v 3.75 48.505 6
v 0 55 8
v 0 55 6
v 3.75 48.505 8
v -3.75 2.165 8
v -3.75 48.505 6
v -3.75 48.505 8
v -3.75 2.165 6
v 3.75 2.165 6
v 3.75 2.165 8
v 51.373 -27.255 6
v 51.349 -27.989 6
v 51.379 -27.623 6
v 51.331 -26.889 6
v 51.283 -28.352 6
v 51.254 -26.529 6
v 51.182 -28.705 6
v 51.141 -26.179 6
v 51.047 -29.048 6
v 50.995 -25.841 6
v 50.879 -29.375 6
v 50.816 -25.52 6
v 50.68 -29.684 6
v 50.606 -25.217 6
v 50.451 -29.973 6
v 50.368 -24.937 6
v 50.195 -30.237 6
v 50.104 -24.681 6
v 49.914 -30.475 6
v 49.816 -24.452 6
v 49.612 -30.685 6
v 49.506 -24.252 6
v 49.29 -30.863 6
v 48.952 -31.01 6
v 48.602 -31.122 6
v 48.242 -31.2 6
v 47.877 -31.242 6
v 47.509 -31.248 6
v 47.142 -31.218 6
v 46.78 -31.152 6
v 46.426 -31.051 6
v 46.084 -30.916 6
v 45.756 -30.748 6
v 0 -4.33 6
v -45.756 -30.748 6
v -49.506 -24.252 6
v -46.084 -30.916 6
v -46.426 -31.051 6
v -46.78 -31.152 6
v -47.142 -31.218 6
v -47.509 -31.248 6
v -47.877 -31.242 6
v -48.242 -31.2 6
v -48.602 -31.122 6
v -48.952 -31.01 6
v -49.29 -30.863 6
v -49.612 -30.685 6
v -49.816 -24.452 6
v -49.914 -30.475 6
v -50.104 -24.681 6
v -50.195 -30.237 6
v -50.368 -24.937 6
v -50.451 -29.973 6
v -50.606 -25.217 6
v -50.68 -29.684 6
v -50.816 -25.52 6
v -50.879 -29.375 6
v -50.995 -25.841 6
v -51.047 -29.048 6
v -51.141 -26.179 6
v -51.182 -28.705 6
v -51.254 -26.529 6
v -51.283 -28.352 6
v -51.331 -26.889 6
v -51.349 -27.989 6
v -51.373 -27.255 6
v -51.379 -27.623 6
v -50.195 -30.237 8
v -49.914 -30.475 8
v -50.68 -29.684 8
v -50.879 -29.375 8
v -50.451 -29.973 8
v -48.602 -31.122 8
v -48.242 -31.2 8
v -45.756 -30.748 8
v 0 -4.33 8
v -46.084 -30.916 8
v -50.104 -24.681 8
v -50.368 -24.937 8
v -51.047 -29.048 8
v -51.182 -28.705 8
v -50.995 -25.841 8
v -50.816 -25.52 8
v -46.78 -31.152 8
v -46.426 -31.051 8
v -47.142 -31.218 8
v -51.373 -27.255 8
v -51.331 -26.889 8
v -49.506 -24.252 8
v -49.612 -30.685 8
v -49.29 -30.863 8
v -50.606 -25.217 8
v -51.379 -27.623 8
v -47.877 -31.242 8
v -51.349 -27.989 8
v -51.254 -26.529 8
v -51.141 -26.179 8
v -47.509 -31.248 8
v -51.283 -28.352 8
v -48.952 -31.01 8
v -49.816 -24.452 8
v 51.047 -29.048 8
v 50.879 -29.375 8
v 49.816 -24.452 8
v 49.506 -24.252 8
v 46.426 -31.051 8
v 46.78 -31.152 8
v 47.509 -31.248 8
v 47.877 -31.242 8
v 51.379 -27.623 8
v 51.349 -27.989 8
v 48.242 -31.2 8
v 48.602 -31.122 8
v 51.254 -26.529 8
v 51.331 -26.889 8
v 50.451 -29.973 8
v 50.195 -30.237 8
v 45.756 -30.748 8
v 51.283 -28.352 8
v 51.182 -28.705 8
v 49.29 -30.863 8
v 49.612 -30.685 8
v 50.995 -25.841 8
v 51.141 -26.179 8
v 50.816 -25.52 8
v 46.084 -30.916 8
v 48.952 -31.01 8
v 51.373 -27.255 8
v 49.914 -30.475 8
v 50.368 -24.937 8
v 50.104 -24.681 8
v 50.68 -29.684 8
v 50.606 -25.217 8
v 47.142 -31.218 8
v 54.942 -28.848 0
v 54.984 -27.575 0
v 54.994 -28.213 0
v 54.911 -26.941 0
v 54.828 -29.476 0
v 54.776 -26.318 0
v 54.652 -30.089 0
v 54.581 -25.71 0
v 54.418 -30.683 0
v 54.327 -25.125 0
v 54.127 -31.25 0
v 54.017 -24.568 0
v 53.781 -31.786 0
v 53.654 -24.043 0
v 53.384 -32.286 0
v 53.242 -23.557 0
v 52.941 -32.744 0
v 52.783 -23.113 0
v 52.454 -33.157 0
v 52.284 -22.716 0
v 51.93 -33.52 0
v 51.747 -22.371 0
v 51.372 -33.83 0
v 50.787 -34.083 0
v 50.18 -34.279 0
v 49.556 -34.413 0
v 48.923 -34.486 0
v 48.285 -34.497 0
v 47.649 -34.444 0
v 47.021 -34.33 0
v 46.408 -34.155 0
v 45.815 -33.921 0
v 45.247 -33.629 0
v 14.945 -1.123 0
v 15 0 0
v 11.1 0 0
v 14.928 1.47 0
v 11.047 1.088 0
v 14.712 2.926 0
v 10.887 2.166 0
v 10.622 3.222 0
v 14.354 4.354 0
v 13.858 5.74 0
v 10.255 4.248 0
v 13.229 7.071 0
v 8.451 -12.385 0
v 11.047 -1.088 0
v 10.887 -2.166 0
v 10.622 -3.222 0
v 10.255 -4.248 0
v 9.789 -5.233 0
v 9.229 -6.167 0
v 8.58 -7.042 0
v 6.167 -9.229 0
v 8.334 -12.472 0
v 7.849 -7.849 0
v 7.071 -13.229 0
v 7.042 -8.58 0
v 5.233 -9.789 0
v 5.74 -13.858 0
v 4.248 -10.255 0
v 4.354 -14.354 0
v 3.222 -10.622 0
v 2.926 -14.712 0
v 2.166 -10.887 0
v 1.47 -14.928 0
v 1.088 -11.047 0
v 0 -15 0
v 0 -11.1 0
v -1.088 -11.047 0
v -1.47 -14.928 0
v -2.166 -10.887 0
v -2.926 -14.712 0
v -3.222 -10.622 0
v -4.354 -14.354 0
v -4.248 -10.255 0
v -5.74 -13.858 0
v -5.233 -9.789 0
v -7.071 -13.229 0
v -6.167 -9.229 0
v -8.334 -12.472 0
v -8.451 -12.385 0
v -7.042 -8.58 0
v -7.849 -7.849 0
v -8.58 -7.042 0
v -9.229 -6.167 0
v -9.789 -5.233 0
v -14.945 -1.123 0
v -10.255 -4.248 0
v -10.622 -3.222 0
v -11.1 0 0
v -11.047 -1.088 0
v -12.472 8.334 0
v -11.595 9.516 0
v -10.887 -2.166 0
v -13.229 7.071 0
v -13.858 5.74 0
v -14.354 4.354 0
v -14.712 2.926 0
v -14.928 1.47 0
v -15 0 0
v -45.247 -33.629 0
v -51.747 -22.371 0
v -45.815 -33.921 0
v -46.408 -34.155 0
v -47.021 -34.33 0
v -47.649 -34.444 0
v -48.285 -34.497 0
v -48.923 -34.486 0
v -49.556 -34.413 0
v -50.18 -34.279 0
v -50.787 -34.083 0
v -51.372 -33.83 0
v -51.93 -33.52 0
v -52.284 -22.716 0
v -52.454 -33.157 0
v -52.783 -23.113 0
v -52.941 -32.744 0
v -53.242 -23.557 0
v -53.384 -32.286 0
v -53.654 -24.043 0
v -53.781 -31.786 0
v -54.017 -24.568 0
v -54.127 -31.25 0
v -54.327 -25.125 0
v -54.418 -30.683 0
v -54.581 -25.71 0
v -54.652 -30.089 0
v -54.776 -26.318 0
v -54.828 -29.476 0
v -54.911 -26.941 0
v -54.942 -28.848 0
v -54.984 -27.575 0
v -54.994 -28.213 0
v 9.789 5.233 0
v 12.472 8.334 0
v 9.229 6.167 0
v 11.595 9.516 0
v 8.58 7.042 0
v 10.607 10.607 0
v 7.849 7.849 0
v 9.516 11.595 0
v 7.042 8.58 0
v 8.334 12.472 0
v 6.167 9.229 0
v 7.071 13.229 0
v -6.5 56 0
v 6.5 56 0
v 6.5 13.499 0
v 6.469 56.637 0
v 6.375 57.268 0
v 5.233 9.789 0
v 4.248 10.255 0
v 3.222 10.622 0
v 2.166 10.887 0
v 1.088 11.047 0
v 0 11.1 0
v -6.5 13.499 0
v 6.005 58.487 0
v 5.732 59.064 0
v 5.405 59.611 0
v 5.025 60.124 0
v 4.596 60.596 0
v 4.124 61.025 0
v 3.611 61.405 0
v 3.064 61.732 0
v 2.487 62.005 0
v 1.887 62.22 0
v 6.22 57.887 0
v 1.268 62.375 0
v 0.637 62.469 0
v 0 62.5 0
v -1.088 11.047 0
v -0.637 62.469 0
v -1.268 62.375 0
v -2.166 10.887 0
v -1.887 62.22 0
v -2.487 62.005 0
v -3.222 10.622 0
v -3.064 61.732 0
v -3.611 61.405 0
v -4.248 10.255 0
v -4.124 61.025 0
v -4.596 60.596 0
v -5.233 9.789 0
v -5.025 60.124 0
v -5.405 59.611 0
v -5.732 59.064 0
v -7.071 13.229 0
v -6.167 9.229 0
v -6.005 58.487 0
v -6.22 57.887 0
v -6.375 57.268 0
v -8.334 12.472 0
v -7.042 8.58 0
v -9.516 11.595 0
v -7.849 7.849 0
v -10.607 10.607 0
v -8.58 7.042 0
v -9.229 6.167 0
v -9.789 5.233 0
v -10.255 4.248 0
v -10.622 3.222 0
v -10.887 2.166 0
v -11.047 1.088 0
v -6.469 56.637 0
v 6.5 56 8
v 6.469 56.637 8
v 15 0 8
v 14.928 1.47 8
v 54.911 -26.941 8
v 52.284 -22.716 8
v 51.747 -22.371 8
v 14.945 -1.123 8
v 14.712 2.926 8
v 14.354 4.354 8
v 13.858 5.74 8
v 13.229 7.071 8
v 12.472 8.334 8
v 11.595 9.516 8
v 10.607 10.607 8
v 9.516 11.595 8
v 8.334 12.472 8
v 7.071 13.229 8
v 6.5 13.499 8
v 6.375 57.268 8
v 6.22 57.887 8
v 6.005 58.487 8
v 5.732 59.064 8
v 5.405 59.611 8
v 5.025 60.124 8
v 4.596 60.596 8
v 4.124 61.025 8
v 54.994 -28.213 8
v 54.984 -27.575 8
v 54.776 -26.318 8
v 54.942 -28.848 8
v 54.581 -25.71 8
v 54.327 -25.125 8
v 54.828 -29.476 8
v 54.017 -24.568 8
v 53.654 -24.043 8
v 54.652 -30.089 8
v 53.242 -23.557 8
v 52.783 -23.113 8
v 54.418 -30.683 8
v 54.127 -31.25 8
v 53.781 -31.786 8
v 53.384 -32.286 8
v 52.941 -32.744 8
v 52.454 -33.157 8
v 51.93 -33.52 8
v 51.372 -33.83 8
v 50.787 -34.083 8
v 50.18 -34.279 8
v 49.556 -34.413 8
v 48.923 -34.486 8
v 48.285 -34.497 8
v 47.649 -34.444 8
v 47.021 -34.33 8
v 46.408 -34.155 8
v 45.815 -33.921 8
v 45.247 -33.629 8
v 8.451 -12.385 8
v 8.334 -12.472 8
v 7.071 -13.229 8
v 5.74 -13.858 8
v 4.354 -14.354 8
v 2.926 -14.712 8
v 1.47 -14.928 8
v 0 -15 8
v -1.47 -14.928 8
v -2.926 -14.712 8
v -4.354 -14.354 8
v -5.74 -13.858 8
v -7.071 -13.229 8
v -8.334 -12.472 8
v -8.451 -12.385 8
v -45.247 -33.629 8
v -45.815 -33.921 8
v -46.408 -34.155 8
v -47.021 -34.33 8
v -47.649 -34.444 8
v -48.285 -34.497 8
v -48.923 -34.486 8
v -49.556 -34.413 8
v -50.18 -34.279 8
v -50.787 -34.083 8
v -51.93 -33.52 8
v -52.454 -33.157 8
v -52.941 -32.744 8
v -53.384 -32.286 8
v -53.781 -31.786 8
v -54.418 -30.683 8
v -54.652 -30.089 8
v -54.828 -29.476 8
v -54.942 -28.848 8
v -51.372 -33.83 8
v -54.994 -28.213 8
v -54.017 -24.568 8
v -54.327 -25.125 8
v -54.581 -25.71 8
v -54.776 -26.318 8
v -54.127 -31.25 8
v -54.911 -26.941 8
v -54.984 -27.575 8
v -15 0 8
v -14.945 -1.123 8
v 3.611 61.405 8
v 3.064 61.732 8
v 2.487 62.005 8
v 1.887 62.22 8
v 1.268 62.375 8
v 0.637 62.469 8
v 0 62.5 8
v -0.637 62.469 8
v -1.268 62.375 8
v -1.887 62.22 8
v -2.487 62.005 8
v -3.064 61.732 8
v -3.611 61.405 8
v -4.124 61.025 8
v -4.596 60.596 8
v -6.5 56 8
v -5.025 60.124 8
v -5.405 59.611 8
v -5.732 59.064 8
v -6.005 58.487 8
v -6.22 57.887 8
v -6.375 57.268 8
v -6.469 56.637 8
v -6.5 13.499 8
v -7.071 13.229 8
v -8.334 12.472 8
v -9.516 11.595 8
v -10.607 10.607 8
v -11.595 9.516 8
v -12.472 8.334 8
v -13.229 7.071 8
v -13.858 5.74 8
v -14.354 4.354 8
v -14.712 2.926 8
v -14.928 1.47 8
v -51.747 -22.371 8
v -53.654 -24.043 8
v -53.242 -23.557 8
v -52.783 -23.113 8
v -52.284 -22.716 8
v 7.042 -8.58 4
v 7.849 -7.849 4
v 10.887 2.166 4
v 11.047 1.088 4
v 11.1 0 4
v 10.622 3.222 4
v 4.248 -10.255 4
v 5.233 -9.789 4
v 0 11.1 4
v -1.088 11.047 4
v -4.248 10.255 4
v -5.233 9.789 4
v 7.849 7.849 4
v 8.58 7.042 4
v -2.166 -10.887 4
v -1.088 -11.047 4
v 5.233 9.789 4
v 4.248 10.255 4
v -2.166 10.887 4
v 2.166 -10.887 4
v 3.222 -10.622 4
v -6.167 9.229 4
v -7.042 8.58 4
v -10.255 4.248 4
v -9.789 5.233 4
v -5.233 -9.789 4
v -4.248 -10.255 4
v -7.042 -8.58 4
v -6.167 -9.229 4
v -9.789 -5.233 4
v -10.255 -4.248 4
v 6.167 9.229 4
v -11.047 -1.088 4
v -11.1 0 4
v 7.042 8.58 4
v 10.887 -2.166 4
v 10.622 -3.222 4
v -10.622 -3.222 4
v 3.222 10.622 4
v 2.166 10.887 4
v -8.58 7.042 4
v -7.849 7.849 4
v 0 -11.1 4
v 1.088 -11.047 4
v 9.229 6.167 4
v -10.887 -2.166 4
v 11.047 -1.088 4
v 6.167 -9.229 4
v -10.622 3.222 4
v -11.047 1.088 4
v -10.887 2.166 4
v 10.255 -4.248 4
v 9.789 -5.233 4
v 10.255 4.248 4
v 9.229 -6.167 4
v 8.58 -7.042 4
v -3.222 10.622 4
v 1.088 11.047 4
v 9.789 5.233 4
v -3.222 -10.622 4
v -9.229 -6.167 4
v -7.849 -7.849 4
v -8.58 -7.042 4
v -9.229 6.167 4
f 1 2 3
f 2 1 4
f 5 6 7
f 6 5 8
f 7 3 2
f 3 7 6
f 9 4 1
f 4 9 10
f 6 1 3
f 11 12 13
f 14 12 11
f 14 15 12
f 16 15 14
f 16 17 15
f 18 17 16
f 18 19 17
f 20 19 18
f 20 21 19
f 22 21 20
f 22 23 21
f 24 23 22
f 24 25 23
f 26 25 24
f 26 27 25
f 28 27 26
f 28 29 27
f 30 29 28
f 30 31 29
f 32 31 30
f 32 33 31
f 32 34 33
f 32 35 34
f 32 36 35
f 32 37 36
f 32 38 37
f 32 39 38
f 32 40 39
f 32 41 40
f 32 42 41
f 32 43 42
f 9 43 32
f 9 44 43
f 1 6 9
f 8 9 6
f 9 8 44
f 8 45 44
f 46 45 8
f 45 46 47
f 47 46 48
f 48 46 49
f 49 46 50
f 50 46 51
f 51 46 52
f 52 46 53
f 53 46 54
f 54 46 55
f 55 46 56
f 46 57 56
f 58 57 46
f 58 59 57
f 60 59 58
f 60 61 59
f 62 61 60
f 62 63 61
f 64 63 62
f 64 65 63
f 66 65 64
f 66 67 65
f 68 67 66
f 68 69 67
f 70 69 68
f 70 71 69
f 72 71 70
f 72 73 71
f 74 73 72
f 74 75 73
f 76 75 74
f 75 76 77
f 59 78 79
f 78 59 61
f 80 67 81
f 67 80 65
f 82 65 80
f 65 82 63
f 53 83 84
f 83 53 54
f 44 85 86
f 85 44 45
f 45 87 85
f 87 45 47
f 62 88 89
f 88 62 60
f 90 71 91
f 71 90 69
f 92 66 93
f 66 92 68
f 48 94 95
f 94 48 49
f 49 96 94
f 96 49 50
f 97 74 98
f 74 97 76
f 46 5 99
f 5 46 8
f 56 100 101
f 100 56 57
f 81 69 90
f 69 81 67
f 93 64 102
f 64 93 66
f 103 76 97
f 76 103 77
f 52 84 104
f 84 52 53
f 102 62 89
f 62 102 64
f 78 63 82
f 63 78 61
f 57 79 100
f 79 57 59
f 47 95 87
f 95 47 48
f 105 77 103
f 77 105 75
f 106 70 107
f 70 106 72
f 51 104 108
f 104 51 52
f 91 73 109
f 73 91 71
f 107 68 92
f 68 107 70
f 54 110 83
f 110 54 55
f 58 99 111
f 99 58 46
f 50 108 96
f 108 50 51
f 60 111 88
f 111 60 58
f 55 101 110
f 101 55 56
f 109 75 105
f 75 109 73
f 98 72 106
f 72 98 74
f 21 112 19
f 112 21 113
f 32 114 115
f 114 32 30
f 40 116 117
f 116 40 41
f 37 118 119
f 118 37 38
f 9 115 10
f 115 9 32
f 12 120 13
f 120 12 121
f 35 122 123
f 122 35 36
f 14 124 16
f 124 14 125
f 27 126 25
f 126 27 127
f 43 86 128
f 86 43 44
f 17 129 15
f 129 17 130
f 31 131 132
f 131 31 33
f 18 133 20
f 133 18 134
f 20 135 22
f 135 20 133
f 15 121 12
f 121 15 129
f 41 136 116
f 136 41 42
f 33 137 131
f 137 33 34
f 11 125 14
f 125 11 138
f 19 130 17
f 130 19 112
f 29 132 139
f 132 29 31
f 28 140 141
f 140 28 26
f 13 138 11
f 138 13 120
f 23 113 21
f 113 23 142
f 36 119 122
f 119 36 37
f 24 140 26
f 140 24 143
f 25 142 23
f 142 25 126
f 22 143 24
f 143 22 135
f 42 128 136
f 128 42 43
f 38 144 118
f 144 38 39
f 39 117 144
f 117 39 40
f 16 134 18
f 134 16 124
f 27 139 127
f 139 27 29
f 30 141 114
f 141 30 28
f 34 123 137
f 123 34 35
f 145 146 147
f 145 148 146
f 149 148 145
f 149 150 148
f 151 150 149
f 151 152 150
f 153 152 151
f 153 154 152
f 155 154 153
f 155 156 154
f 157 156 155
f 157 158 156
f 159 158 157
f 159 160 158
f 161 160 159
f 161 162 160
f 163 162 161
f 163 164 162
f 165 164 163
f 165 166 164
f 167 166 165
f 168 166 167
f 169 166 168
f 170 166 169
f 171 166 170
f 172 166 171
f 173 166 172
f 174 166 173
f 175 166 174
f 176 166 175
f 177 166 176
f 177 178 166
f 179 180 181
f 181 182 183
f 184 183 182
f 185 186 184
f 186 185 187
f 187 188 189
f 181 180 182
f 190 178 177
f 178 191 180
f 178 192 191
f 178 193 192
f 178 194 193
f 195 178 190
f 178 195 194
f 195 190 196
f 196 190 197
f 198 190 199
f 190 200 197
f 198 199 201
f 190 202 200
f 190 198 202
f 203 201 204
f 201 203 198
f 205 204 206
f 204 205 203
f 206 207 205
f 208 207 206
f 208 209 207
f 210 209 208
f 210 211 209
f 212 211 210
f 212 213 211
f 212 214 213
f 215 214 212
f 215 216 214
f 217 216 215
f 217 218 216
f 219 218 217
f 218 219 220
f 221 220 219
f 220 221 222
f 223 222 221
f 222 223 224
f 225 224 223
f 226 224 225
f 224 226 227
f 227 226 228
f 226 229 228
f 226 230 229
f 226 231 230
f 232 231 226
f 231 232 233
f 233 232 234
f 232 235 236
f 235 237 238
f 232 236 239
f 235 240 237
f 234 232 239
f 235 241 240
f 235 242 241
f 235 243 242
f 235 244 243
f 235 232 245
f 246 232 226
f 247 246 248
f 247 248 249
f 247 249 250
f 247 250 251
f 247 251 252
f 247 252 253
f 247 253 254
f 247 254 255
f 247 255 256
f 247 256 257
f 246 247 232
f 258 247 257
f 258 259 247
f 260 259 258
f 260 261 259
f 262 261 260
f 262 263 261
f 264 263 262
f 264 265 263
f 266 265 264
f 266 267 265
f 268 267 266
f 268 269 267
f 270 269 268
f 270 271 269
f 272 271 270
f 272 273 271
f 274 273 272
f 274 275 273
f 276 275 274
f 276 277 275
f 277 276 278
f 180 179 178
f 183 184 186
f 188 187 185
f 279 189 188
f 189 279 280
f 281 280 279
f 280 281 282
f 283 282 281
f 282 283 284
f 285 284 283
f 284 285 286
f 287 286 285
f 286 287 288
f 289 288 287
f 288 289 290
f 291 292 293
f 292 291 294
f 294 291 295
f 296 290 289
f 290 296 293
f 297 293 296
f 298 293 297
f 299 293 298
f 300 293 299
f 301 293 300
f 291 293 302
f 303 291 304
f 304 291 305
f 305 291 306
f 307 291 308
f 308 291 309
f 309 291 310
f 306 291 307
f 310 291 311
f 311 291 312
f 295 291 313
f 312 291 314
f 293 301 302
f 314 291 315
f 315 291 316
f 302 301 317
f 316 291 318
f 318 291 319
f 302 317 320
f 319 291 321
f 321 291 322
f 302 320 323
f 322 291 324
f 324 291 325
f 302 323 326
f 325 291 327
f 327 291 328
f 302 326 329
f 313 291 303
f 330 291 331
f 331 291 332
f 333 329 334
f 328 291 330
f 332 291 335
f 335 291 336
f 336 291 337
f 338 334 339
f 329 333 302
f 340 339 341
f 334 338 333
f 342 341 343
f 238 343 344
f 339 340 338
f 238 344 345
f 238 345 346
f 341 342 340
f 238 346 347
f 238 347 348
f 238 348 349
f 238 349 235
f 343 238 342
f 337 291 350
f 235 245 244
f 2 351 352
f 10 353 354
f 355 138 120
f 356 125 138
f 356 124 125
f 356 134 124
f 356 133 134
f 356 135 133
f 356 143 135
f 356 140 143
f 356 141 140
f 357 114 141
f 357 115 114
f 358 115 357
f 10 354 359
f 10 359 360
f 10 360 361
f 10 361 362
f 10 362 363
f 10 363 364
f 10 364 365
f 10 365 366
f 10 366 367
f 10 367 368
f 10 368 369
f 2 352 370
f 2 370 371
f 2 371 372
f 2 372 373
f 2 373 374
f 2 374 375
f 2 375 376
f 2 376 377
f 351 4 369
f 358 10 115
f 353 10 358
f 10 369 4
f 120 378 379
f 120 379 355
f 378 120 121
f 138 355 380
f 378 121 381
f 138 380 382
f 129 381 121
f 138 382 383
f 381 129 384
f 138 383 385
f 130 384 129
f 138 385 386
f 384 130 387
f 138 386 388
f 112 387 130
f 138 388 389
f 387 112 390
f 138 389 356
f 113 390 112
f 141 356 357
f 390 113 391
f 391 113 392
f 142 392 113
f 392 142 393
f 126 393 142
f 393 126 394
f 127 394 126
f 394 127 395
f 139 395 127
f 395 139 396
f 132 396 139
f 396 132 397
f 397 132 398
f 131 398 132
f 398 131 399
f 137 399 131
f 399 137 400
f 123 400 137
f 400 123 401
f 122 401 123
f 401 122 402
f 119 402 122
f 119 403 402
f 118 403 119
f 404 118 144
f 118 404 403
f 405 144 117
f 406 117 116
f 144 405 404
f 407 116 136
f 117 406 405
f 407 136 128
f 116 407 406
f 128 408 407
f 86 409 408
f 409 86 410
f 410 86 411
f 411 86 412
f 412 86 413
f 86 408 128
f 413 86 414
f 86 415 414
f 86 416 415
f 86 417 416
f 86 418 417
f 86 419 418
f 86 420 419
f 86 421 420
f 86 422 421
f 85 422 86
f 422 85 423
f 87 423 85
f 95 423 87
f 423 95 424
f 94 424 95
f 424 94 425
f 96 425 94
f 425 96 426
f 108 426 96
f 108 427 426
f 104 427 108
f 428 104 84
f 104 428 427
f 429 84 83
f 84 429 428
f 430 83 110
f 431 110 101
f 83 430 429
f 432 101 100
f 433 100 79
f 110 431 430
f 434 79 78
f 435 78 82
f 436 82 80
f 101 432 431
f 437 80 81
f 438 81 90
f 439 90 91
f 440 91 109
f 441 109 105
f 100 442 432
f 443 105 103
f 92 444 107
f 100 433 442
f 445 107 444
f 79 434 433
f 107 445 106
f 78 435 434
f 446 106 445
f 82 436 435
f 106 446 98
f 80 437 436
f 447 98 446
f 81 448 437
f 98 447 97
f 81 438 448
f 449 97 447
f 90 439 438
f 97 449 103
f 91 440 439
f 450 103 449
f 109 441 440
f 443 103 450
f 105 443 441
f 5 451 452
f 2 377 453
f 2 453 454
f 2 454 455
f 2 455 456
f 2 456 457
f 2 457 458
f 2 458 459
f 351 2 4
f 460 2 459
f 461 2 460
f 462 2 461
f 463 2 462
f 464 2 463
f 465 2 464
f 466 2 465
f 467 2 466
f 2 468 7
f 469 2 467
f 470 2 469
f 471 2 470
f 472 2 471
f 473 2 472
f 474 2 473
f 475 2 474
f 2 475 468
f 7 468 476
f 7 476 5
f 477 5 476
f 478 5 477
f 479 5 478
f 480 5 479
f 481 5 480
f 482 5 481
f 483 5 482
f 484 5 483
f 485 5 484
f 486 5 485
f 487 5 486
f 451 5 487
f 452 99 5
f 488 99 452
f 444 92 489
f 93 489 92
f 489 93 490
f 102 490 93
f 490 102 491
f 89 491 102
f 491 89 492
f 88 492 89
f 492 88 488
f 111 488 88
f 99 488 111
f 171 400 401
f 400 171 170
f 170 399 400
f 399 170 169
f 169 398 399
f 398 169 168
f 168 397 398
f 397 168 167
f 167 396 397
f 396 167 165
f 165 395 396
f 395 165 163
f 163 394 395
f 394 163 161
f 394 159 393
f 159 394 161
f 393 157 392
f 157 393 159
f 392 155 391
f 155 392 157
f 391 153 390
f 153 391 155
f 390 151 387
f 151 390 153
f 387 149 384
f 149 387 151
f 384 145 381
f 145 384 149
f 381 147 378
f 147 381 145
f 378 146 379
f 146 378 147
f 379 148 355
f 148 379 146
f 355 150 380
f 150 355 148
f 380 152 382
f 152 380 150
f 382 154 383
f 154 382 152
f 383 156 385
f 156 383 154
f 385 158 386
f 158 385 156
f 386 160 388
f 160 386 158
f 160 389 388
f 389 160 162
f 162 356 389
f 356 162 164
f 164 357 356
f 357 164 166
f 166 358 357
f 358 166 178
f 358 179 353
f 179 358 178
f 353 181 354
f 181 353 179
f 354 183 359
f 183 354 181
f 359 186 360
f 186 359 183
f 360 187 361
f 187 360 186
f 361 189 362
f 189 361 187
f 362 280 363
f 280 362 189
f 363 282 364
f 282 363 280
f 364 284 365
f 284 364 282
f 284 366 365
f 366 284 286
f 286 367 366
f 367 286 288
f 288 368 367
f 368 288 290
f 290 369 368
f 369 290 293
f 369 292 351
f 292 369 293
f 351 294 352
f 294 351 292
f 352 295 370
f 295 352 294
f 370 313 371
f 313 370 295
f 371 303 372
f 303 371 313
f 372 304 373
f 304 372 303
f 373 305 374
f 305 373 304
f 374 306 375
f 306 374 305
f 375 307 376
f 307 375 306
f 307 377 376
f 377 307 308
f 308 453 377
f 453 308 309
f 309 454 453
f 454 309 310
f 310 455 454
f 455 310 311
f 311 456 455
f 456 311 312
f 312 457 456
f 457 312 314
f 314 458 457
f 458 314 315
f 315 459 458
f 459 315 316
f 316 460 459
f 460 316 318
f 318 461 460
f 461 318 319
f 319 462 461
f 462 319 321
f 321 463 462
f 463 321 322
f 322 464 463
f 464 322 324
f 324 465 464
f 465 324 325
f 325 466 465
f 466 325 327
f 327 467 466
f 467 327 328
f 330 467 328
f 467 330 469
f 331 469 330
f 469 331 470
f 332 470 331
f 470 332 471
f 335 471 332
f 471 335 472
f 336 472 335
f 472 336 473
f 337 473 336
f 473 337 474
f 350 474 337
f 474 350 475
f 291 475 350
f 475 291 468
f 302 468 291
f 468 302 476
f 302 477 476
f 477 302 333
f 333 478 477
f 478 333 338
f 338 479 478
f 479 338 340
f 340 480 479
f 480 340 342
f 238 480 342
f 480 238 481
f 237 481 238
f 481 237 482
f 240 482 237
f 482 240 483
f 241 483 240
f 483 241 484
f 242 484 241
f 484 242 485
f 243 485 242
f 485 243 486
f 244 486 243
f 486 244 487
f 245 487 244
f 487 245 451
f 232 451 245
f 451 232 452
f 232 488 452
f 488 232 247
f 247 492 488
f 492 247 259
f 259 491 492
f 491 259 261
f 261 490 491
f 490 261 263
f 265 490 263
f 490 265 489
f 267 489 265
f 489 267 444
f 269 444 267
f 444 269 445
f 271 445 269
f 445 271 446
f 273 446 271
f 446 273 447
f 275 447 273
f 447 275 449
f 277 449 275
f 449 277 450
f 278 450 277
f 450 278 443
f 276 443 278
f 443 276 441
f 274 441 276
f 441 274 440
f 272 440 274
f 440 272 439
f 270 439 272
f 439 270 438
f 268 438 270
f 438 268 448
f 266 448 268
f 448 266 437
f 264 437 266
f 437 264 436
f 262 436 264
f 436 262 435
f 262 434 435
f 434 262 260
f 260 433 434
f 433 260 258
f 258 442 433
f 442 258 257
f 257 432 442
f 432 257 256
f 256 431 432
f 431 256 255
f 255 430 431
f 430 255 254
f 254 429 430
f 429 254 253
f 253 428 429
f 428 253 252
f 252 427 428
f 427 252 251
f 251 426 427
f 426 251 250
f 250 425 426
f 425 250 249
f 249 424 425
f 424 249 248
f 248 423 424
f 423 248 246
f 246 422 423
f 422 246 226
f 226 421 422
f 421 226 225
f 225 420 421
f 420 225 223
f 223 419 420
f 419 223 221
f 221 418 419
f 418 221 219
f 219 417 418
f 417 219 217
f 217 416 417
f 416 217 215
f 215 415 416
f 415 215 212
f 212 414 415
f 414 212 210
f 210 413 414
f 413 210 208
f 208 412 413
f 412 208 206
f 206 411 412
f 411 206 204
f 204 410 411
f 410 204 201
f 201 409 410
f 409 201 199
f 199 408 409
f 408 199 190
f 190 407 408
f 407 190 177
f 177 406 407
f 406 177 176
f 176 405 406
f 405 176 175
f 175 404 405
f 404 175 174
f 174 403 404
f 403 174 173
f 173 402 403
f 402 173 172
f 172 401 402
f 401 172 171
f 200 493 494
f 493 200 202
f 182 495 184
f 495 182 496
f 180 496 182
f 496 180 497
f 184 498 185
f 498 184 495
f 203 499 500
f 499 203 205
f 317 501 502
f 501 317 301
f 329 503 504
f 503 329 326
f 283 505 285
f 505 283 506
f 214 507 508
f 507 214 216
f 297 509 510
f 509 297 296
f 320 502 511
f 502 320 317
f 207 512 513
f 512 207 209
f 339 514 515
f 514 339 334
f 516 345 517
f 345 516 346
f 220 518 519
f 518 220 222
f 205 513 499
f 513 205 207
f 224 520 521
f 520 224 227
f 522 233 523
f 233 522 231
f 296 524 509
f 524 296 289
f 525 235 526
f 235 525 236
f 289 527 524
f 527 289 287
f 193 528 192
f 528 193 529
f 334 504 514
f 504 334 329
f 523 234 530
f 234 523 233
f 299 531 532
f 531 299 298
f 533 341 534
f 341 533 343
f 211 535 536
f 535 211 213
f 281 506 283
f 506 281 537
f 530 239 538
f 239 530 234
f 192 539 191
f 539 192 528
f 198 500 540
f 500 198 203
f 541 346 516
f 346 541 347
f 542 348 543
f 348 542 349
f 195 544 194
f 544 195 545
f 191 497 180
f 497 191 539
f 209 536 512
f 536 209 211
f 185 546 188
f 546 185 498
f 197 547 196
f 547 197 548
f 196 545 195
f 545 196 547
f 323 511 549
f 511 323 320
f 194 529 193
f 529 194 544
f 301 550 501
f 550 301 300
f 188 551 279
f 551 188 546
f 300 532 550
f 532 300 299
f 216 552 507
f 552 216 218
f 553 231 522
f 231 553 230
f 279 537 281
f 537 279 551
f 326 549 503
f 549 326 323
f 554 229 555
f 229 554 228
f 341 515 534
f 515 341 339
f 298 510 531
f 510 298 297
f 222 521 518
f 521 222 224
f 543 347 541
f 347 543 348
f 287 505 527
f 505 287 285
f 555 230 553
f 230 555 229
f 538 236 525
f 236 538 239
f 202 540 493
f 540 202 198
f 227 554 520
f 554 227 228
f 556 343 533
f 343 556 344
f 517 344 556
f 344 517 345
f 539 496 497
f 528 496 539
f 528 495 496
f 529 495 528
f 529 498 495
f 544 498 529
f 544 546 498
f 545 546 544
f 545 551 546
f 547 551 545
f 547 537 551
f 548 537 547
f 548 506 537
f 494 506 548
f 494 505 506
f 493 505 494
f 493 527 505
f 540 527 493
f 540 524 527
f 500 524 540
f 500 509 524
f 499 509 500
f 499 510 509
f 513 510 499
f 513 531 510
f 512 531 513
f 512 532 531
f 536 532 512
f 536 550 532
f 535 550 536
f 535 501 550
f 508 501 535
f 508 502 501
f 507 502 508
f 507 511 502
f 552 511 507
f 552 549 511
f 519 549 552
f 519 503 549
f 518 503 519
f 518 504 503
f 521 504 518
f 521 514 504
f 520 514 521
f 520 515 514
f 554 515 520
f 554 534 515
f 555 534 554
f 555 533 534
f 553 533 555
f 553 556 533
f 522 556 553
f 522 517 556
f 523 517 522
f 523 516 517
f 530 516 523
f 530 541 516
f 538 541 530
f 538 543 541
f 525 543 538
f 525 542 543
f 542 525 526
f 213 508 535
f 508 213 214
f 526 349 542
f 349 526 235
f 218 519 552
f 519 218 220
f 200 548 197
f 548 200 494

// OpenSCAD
// ===================================================================
// Lazy Susan Mount Plate
//
// A symmetric 3-arm plate that sits on top of a lazy susan bearing
// mechanism and gives an impossible object (from impossible.scad)
// somewhere to seat.
//
//   - The bottom face is flat.
//   - The top face has a 2 mm deep Y-shaped groove, sized for the
//     current impossible-object feet (same geometry as the groove in
//     viewing_box.scad), which centers and orients the object.
//
// Axes: X/Y = plate footprint, Z = up. Bottom face sits at Z = 0;
// the top face is at Z = box_height.
//
// Print orientation: see the notes at the end of this file. The short
// version — print with the top (groove) face DOWN on the build
// plate. That gives the smoothest possible top surface (a mirror of
// the bed) with zero supports.
// ===================================================================

/* [Dimensions of the object (mm)] */
leg_diameter          = 3;    // must match leg_diameter in impossible.scad
foot_height           = 2;    // must match foot_height in impossible.scad
foot_width_90         = 7;    // must match foot_width_90 in impossible.scad
foot_diameter_others  = 7;    // must match foot_diameter_others in impossible.scad
object_width          = 110;  // must match width in impossible.scad; sets how far the groove arms reach

/* [Preview mode] */
show_spinner          = true;  // true: show 3-arm spinner, false: show base

/* [Overall plate dimensions (mm)] */
box_height   = 8;    // Z: overall plate thickness
arm_length   = object_width / 2+1;   // center to rounded outer tip of each arm
arm_width    = 13;   // width of each arm (main shape tuning parameter)
hub_diameter = 30;   // central round hub joining the three arms

/* [Base dimensions (mm)] */
base_height          = 3;
base_radius          = object_width / 3;
base_center_diameter = 10;
base_center_extra    = 1;    // center cylinder rises this much above base_height
base_top_extra       = 6.5;  // top post rises this much above center cylinder
base_top_radius      = 3.9;

/* [Top groove for the impossible-object feet] */
// Y-shaped groove sunk into the top face, centered on the plate.
// Sized to match the leg/foot parameters of the current version of
// impossible.scad, so the object's feet drop in and self-center.
groove_clearance      = .5;    // groove is this much wider than the feet
groove_depth          = foot_height;  // groove depth matches the foot so it sits fully recessed
groove_length         = object_width / 2;  // length of each arm from the center

/* [Bottom insert pocket (mm)] */
insert_diameter       = 22;    // your round insert diameter
insert_clearance      = 0.2;   // small added diameter for snug fit
insert_pocket_depth   = 4;     // pocket depth from bottom face

/* [Preview / debug helpers] */
show_top_groove     = true;

plate_color = "DeepSkyBlue";

$fn = 64;

// ===== Checks =====
assert(arm_width > max(leg_diameter, foot_width_90, foot_diameter_others) + groove_clearance,
    "arm_width must be wider than the widest groove arm");
assert(hub_diameter >= arm_width,
    "hub_diameter should be at least arm_width so the center blend stays smooth");
assert(groove_depth > 0 && groove_depth < box_height,
    "groove_depth must be greater than 0 and less than box_height");
assert(insert_pocket_depth > 0 && insert_pocket_depth < box_height,
    "insert_pocket_depth must be greater than 0 and less than box_height");
assert(base_height > 0 && base_radius > 0,
    "base_height and base_radius must be positive");
assert(base_center_diameter > 0 && base_top_radius > 0,
    "base_center_diameter and base_top_radius must be positive");
assert(groove_length + max(leg_diameter, foot_width_90, foot_diameter_others) / 2 + groove_clearance
        <= arm_length + arm_width / 2,
    "groove arms reach past the end of the plate arm; decrease groove_length/object_width or increase arm_length");
assert(groove_length > (foot_width_90 + groove_clearance) * sqrt(3) / 2,
    "groove_length is too short for the fish-eye tip on the 90-degree arm; increase groove_length/object_width or decrease foot_width_90/groove_clearance");

// ===== Geometry =====

// Rounded 2D arm using two equal circles so both ends are curved.
module arm_capsule_2d(l, w) {
    hull() {
        circle(d = w);
        translate([l, 0])
            circle(d = w);
    }
}

// Symmetric three-arm footprint with curved outer ends.
module three_arm_plate_2d(l, w, hub_d) {
    union() {
        circle(d = hub_d);
        for (a = [90, 210, 330])
            rotate([0, 0, a])
                arm_capsule_2d(l, w);
    }
}

// Straight-sided slot, width w, that the almond-shaped foot on the
// 90-degree leg can slide down into: parallel sides for most of its
// run, tapering to a point only over the last stretch, at the same
// taper the almond foot itself tapers to its tip (see almond_2d in
// impossible.scad: half-length sqrt(3) * w / 2 beyond the foot's
// widest point). The rounded near end blends into the hub where the
// three arms meet.
module fisheye_slot_2d(w, l) {
    tip_reach = w * sqrt(3) / 2;
    straight_end = l - tip_reach;
    union() {
        circle(d = w);
        polygon(points = [
            [0, -w / 2],
            [straight_end, -w / 2],
            [l, 0],
            [straight_end, w / 2],
            [0, w / 2],
        ]);
    }
}

// Y-shaped centering groove: three slots radiating from the plate
// center, sunk groove_depth into the top face. One arm toward the
// back (+Y) and the other two 120/240 degrees around, matching the
// three legs generated by impossible.scad. The 90-degree arm is a
// straight-sided slot that only points at its far end, echoing the
// almond-shaped foot that slides into it, so its shape alone marks
// where that leg goes; the other two arms stay plain rounded-rectangle
// slots for the round feet.
module top_groove() {
    for (a = [90, 210, 330]) {
        gw = max(leg_diameter,
                 a == 90 ? foot_width_90 : foot_diameter_others)
             + groove_clearance;
        rotate([0, 0, a])
            linear_extrude(height = groove_depth + 1)
                if (a == 90)
                    fisheye_slot_2d(gw, groove_length);
                else
                    hull() {
                        circle(d = gw);
                        translate([groove_length, 0])
                            circle(d = gw);
                    }
    }
}

module lazy_susan_plate() {
    difference() {
        linear_extrude(height = box_height)
            three_arm_plate_2d(arm_length, arm_width, hub_diameter);

        // Round recess in the underside for a press-fit insert.
        translate([0, 0, -1])
            cylinder(d = insert_diameter + insert_clearance,
                     h = insert_pocket_depth + 1);

        if (show_top_groove)
            translate([0, 0, box_height - groove_depth])
                top_groove();
    }
}

module base_object() {
    union() {
        cylinder(r = base_radius, h = base_height);
        cylinder(d = base_center_diameter, h = base_height + base_center_extra);
        translate([0, 0, base_height + base_center_extra])
            cylinder(r = base_top_radius, h = base_top_extra);
    }
}

echo(str("Plate: 3-arm, height ", box_height, " mm"));
echo(str("Arm geometry: length ", arm_length, " mm, width ", arm_width,
         " mm, hub ", hub_diameter, " mm"));
echo(str("Top groove: ", groove_depth, " mm deep, arms ", groove_length, " mm long"));
echo(str("Bottom insert pocket: d=", insert_diameter + insert_clearance,
         " mm, depth=", insert_pocket_depth, " mm"));
echo(str("Base: r=", base_radius, " mm, h=", base_height,
         " mm, center d=", base_center_diameter,
         " mm, top post r=", base_top_radius, " mm"));

if (show_spinner)
    color(plate_color) lazy_susan_plate();
else
    color(plate_color) base_object();

// ===================================================================
// Printing notes
// ===================================================================
// The underside includes a centered round insert pocket. Groove-face
// down is still a good default when you want the smoothest possible
// top-facing surface.
